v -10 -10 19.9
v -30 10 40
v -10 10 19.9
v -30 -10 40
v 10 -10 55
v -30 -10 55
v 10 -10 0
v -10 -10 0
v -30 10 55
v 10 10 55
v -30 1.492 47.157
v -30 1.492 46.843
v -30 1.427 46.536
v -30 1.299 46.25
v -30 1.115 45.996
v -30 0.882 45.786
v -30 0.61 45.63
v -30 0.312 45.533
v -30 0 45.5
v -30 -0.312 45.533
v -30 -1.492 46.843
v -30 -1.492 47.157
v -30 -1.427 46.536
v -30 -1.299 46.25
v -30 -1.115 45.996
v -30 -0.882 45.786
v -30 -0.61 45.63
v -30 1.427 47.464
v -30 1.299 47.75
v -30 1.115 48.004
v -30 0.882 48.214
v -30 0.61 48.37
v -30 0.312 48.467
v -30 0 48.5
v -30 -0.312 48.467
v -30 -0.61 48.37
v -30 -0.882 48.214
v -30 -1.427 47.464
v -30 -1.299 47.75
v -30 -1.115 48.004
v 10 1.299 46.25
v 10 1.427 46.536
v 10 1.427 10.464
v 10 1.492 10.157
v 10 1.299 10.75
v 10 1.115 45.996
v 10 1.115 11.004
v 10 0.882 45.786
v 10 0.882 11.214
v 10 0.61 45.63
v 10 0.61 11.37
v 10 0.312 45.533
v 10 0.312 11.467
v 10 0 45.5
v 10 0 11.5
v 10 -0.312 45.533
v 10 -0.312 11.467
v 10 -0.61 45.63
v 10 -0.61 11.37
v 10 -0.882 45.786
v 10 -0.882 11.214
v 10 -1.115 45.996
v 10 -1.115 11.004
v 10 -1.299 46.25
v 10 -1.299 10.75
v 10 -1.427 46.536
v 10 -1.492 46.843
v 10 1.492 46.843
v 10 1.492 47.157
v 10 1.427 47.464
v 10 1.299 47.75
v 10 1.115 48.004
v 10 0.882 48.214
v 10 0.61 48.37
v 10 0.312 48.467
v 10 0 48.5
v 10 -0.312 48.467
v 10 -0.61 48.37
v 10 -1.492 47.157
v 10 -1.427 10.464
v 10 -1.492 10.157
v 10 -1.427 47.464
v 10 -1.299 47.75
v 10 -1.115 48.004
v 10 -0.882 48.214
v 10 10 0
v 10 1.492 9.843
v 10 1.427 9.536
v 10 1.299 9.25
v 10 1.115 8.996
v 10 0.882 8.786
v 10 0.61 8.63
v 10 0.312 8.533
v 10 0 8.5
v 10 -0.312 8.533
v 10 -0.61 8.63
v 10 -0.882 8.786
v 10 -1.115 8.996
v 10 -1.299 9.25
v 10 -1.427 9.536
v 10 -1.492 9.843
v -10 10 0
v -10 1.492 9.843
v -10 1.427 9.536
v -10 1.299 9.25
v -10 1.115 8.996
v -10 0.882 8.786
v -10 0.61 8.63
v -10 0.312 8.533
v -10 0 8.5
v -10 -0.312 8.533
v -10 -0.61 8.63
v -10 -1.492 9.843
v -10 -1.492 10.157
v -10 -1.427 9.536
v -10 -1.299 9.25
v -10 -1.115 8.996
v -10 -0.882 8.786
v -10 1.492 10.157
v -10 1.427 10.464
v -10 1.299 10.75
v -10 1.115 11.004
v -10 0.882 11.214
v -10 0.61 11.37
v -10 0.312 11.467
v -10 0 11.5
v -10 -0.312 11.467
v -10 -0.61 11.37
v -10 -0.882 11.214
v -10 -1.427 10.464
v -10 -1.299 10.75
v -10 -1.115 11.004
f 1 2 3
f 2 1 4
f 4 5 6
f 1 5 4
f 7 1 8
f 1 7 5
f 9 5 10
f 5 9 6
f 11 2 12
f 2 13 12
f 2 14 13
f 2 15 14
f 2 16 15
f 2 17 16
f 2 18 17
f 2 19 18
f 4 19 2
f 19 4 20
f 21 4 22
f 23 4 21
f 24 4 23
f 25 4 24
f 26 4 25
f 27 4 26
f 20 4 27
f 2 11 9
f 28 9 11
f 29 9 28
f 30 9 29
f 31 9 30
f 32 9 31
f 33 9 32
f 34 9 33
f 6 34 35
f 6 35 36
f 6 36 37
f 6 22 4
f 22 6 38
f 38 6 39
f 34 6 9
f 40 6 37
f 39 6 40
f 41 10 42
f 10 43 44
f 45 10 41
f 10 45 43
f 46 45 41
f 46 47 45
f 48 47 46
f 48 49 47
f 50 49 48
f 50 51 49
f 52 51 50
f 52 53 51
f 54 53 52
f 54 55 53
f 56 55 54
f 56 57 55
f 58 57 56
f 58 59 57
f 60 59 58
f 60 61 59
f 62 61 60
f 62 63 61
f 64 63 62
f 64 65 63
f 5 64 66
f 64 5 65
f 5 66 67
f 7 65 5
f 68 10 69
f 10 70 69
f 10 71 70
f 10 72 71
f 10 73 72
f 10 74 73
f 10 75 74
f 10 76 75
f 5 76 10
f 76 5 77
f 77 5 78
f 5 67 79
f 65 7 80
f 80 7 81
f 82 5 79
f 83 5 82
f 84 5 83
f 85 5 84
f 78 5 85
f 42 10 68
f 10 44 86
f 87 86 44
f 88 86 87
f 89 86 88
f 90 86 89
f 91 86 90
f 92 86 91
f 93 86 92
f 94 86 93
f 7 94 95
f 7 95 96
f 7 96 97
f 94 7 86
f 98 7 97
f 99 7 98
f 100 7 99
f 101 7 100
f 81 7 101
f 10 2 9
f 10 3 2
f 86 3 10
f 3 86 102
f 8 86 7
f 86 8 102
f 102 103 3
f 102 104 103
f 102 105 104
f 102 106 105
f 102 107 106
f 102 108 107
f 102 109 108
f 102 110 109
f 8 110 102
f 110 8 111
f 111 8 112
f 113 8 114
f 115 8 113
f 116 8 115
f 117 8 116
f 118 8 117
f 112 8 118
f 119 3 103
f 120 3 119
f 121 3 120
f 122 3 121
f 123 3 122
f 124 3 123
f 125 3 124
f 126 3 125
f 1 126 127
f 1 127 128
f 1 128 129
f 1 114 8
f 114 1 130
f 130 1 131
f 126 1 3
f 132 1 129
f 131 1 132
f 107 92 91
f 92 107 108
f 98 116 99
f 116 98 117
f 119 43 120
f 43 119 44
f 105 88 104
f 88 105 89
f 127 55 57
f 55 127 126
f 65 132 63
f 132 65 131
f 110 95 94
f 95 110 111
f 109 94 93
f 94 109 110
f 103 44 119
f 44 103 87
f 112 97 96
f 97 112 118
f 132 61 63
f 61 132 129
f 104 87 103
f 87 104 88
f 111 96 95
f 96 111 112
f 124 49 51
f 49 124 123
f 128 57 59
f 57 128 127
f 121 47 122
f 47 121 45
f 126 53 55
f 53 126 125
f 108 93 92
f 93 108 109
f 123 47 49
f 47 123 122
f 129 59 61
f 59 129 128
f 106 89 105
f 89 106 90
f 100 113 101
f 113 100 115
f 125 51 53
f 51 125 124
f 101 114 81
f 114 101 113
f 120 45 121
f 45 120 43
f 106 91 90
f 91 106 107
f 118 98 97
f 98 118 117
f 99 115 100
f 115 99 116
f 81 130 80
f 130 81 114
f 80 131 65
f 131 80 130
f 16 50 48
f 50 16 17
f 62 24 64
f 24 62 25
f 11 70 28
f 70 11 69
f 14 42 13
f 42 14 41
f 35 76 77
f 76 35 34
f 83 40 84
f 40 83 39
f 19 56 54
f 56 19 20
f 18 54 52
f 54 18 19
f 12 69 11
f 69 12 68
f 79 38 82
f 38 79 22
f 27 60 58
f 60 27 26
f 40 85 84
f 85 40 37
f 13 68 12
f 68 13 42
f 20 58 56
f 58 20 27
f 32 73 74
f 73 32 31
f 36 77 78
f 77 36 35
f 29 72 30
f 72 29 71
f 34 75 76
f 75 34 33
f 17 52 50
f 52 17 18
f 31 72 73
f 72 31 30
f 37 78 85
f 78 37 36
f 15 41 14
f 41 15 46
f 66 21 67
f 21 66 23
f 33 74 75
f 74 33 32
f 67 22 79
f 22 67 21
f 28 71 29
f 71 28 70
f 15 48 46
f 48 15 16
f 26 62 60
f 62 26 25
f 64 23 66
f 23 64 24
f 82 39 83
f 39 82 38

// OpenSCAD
$fn=30;

w1 = 20;
l1 = 130;
h1 = 8;
w12 = 18;
h12 = 20;
w13 = 18;
mounth=50;
mountw=55;
w14 = mountw;
h13 = 2;
d1 = 3;
supportoffset = 13;
supporth = 35;
supportw = 18;

r3 = 8;
e3 = 10;
h3b = 2;
h3c = 10;

p5r = 12.0;
p5l = 150;
p5h = 3;
p5w = 2*p5r;
p5e = e3;
p5centerw = 22;
p5supporth = 35;
p5supportgap = 13;
p5highsupportw = 40;
p5supportoffset = 18;
p5attachw = 10;

internalcircled = 22+1.5;
screw_offsetw = 31;
screw_d = 2+2;
nemaw = 42;

//p4r = 12.0;
p4l = 100;
p4d = 12.0;

module p4(){
    translate([0, 0, 0])
    rotate([0, 0, 90]){
    translate([-p4l-p5supportgap*2*d1+10, 0, 0])
    linear_extrude(p4d){
    union(){
        hull(){
            circle(d=d1);
            translate([p4l, 0, 0]) square(d1,center=true);
        }
        
        circler = p5supportgap+2*d1+10;
        circler2 = circler - d1;
        difference(){
            translate([p4l+circler, 0, 0]) circle(r=circler);
            translate([p4l+circler, 0, 0]) circle(r=circler2);
            translate([p4l+circler+5000, 0, 0]) square([10000, 10000], center=true);
        }
        
        hull(){
            translate([p4l+circler-d1/2, circler-d1*0.6, 0]) square(d1,center=true);
            translate([p4l+circler+20, circler-d1*0.6, 0]) square(d1,center=true);
        }
        
        hull(){
            translate([p4l+circler-d1/2, -circler+d1*0.6, 0]) square(d1,center=true);
            translate([p4l+circler+20, -circler+d1*0.6, 0]) square(d1,center=true);
        }
    }
    }
    }
    
//    hull(){
//    }
}

module p2(){
    // todo
}

module p5_simpleattachment(){
    mr = 3.3;
    mr2 = 1.35;
    hr = 3.2/2;
    h = 20;
    d = 45;
    difference(){
        union(){
            hull(){
                cylinder(r=mr, h=h);
                translate([mr+mr2*2, 0, 0]) cylinder(r=mr2, h=h);
            }
            hull(){
                translate([d-2*mr-mr2*2, 0, 0]) cylinder(r=mr2, h=h);
                translate([d-mr, 0, 0]) cylinder(r=mr, h=h);
            }
            hull(){
                translate([mr+mr2*2, 0, 0]) cylinder(r=mr2, h=h);
                translate([d-2*mr-mr2*2, 0, 0]) cylinder(r=mr2, h=h);
            }
            
        }
        translate([0, 0, -1]) cylinder(r=hr, h=h+2);
        translate([d-mr, 0, -1]) cylinder(r=hr, h=h+2);
    }
}

module everything(){
    p1();
//    p2();
//    p3();
//    p4();
//    p5();
//    p5_simpleattachment();
}

everything();

module p5(){
    difference(){
        union(){
            translate([0, 0, h1+h12+mounth/2]){
                rotate([0, -90, 0]){
                    // arm base plate (mount side)
                    intersection(){
                        translate([0, 0, p5centerw/2-p5h/2]) {
                            linear_extrude(p5h){
                                hull(){
                                    translate([0, 0, 0]) circle(r=p5r);
                                    translate([p5l, 0, 0]) circle(r=p5r);
                                }
                            }
                        }
                        translate([500+mounth/2-0.1, 0, 0]) cube([1000, 1000, 1000], center=true);
                    }
                    
                    // arm base plate (not mount side)
                    translate([0, 0, -p5centerw/2-p5h/2]){
                        linear_extrude(p5h){
                            hull(){
                                circle(r=p5r);
                                translate([p5l, 0, 0]) circle(r=p5r);
                            }
                        }
                    }
                    
                    // cylinder
                    translate([d1, 0, -p5centerw/2-h3c-d1/2+0.01])
                        cylinderMount();
                    
                    // mount support
                    translate([-mounth/2, mountw/2, p5centerw/2-d1/2])
                        rotate([0, -90, 180])
                            nema17mount();
                    
                    // support plates
                    // mount side
                    difference(){
                        union(){
                            rotate([90, 0, 0]){
                                translate([mounth/2+p5supportoffset, p5centerw/2, p5r-d1])
                                    linear_extrude(d1)
                                        square([p5supporth, p5attachw]);
                                translate([mounth/2+p5supportoffset, p5centerw/2, -p5r])
                                    linear_extrude(d1)
                                        square([p5supporth, p5attachw]);
                            }
                            rotate([90, 0, 0]){
                                translate([mounth/2+p5supporth +p5supportoffset+p5supportgap, p5centerw/2, p5r-d1])
                                    linear_extrude(d1)
                                        square([p5supporth, p5attachw]);
                                translate([mounth/2+p5supporth +p5supportoffset+p5supportgap, p5centerw/2, -p5r])
                                    linear_extrude(d1)
                                        square([p5supporth, p5attachw]);
                            }
                        }
                        translate([mounth/2+p5supportoffset+p5supporth/2, p5r+5, p5centerw/2+p5attachw/2]) rotate([90, 0, 0]) cylinder(r=1.9, h=2*p5r+10);
                        translate([mounth/2+p5supportoffset+p5supporth/2+p5supportgap+p5supporth, p5r+5, p5centerw/2+p5attachw/2]) rotate([90, 0, 0]) cylinder(r=1.9, h=2*p5r+10);
                    }
                    
                    // non-mount side
                    difference(){
                        union(){
                            rotate([90, 0, 0]){
                                translate([mounth/2+p5supportoffset, -p5centerw/2-p5attachw, p5r-d1])
                                    linear_extrude(d1)
                                        square([p5supporth, p5attachw]);
                                translate([mounth/2+p5supportoffset, -p5centerw/2-p5attachw, -p5r])
                                    linear_extrude(d1)
                                        square([p5supporth, p5attachw]);
                            }
                            rotate([90, 0, 0]){
                                translate([mounth/2+p5supporth +p5supportoffset+p5supportgap, -p5centerw/2-p5attachw, p5r-d1])
                                    linear_extrude(d1)
                                        square([p5supporth, p5attachw]);
                                translate([mounth/2+p5supporth +p5supportoffset+p5supportgap, -p5centerw/2-p5attachw, -p5r])
                                    linear_extrude(d1)
                                        square([p5supporth, p5attachw]);
                            }
                        }
                        translate([mounth/2+p5supportoffset+p5supporth/2, p5r+5, -p5centerw/2-p5attachw/2]) rotate([90, 0, 0]) cylinder(r=1.9, h=2*p5r+10);
                        translate([mounth/2+p5supportoffset+p5supporth/2+p5supportgap+p5supporth, p5r+5, -p5centerw/2-p5attachw/2]) rotate([90, 0, 0]) cylinder(r=1.9, h=2*p5r+10);
                    }
                }
            }
        }
        
        // negative(s)
                translate([-500000, 0, h1+h12+p5l+mounth/2]) rotate([0, 90, 0]) cylinder(r=2.6, h=999999);

    }        
}


module p1(){
    if(0)
    difference(){
        translate([0, -w1/2, 0]) linear_extrude(h1) square([l1, w1]);
        
        translate([l1-18, -25, h1-3]) cube([19, 50, 100]);
        translate([l1-7, 0, -0.1]) cylinder(d=3, h=100); 
        
        
        translate([10, 0, -0.1]) cylinder(d=3, h=100); 
        translate([10+10*1, 0, -0.1]) cylinder(d=3, h=100); 
        translate([10+10*2, 0, -0.1]) cylinder(d=3, h=100); 
        translate([10+10*3, 0, -0.1]) cylinder(d=3, h=100); 
        translate([10+10*4, 0, -0.1]) cylinder(d=3, h=100); 
        translate([10+10*5, 0, -0.1]) cylinder(d=3, h=100); 
        translate([10+10*6, 0, -0.1]) cylinder(d=3, h=100); 
       
        hull(){
            translate([l1-24, 0, -0.1]) cylinder(d=3, h=100);
            translate([l1-24-36, 0, -0.1]) cylinder(d=3, h=100); 
        }
    }
    
    difference(){
        union(){
            hull(){
                translate([-10, -w1/2, 19.9]) cube([20, w1, 0.1]);
                translate([-30, -w1/2, 40]) cube([40, w1, 15]);
            }   
            translate([-10, -w1/2, 0]) cube([20, w1, 20]);
        }
        translate([-20, 0, 10]) rotate([0, 90, 0]) cylinder(d=3, h=100);
        translate([-50, 0, 47]) rotate([0, 90, 0]) cylinder(d=3, h=100);
    }
        

    // static side
    if(0)
    difference(){
        hull(){
            translate([l1-(r3+e3), -w1/2, h1]) linear_extrude(h1) square([w12, w1]);
            translate([l1-(r3+e3), -w14/2, h1+h12]) linear_extrude(h13) square([w13, w14]);
        }
        
        // negative
        hull(){
            translate([l1-(r3+e3)+d1+1, -w1/2 + d1, h1]) cube([100, w1-2*d1, 0.1]);
            translate([l1-(r3+e3)+d1, -w14/2 + d1, h1+h12]) cube([100, w14-2*d1, 0.01]);
        }
    }
    
    // non static side
//    translate([]) 'cube([40, 50, 10], center=true);
    
    //mount
    if(0)
    translate([l1-(r3+e3), -mountw/2, h1+h12])
        nema17mount();
    
    
}

module p3(){
    w1temp = 2*(r3+e3);
    w2temp = 2*(r3);
    
    translate([-w1temp/2, -w2temp/2, -h3b]) linear_extrude(h3b) square([w1temp, w2temp]);
    
    translate([0, 0, -h3b-h3c+0.01])
        cylinderMount();
}


module flatheadHole(h){
    intersection(){
        cylinder(d=5, h=h);
        translate([-1.5, -5, 0]) cube([10, 10, 100]);
    }
}

module cylinderMount(){
    difference(){
        cylinder(r=r3, h=h3c);
        translate([0, 0, -0.1]) flatheadHole(h=h3c+0.2);
    }
}

module ra_triangle(base, height, depth){
    points = [[0, 0], [base, 0], [base, height]];
    
    translate([-base, 0, -depth/2]) linear_extrude(depth) polygon(points=points);
}

module nema17mount(){
    difference(){
        union(){
            //mount
            translate([+d1/2, mountw/2, mounth/2]) cube([d1, mountw, mounth], center=true);
            
            // mount support
            if(0){
                translate([0, d1/2, d1-0.01]) rotate([90, 0, 180]) ra_triangle(supportw, supporth, d1);
                translate([0, mountw-d1/2, d1-0.01]) rotate([90, 0, 180]) ra_triangle(supportw, supporth, d1);
                        
                // mount base
                translate([0, 0, 0]){
                    rotate([0, 0, 0]){
                        linear_extrude(d1){
                            square([supportw, mountw]);
                        }
                    }
                }
            }
        }
        
        // negative(s)
        
        // center hole
        rotate([0, 90, 0]) translate([-mounth/2-d1, mountw/2, -0.1]) cylinder(d=internalcircled, h=d1+0.2);
        
        // screw holes
        rotate([0, 90, 0]) translate([-mounth/2-d1 + 0.5 * screw_offsetw, mountw/2 + 0.5 * screw_offsetw, -0.1]) cylinder(d=screw_d, h=d1+0.2);
        rotate([0, 90, 0]) translate([-mounth/2-d1 - 0.5 * screw_offsetw, mountw/2 - 0.5 * screw_offsetw, -0.1]) cylinder(d=screw_d, h=d1+0.2);
        rotate([0, 90, 0]) translate([-mounth/2-d1 - 0.5 * screw_offsetw, mountw/2 + 0.5 * screw_offsetw, -0.1]) cylinder(d=screw_d, h=d1+0.2);
        rotate([0, 90, 0]) translate([-mounth/2-d1 + 0.5 * screw_offsetw, mountw/2 - 0.5 * screw_offsetw, -0.1]) cylinder(d=screw_d, h=d1+0.2);
    }
}
